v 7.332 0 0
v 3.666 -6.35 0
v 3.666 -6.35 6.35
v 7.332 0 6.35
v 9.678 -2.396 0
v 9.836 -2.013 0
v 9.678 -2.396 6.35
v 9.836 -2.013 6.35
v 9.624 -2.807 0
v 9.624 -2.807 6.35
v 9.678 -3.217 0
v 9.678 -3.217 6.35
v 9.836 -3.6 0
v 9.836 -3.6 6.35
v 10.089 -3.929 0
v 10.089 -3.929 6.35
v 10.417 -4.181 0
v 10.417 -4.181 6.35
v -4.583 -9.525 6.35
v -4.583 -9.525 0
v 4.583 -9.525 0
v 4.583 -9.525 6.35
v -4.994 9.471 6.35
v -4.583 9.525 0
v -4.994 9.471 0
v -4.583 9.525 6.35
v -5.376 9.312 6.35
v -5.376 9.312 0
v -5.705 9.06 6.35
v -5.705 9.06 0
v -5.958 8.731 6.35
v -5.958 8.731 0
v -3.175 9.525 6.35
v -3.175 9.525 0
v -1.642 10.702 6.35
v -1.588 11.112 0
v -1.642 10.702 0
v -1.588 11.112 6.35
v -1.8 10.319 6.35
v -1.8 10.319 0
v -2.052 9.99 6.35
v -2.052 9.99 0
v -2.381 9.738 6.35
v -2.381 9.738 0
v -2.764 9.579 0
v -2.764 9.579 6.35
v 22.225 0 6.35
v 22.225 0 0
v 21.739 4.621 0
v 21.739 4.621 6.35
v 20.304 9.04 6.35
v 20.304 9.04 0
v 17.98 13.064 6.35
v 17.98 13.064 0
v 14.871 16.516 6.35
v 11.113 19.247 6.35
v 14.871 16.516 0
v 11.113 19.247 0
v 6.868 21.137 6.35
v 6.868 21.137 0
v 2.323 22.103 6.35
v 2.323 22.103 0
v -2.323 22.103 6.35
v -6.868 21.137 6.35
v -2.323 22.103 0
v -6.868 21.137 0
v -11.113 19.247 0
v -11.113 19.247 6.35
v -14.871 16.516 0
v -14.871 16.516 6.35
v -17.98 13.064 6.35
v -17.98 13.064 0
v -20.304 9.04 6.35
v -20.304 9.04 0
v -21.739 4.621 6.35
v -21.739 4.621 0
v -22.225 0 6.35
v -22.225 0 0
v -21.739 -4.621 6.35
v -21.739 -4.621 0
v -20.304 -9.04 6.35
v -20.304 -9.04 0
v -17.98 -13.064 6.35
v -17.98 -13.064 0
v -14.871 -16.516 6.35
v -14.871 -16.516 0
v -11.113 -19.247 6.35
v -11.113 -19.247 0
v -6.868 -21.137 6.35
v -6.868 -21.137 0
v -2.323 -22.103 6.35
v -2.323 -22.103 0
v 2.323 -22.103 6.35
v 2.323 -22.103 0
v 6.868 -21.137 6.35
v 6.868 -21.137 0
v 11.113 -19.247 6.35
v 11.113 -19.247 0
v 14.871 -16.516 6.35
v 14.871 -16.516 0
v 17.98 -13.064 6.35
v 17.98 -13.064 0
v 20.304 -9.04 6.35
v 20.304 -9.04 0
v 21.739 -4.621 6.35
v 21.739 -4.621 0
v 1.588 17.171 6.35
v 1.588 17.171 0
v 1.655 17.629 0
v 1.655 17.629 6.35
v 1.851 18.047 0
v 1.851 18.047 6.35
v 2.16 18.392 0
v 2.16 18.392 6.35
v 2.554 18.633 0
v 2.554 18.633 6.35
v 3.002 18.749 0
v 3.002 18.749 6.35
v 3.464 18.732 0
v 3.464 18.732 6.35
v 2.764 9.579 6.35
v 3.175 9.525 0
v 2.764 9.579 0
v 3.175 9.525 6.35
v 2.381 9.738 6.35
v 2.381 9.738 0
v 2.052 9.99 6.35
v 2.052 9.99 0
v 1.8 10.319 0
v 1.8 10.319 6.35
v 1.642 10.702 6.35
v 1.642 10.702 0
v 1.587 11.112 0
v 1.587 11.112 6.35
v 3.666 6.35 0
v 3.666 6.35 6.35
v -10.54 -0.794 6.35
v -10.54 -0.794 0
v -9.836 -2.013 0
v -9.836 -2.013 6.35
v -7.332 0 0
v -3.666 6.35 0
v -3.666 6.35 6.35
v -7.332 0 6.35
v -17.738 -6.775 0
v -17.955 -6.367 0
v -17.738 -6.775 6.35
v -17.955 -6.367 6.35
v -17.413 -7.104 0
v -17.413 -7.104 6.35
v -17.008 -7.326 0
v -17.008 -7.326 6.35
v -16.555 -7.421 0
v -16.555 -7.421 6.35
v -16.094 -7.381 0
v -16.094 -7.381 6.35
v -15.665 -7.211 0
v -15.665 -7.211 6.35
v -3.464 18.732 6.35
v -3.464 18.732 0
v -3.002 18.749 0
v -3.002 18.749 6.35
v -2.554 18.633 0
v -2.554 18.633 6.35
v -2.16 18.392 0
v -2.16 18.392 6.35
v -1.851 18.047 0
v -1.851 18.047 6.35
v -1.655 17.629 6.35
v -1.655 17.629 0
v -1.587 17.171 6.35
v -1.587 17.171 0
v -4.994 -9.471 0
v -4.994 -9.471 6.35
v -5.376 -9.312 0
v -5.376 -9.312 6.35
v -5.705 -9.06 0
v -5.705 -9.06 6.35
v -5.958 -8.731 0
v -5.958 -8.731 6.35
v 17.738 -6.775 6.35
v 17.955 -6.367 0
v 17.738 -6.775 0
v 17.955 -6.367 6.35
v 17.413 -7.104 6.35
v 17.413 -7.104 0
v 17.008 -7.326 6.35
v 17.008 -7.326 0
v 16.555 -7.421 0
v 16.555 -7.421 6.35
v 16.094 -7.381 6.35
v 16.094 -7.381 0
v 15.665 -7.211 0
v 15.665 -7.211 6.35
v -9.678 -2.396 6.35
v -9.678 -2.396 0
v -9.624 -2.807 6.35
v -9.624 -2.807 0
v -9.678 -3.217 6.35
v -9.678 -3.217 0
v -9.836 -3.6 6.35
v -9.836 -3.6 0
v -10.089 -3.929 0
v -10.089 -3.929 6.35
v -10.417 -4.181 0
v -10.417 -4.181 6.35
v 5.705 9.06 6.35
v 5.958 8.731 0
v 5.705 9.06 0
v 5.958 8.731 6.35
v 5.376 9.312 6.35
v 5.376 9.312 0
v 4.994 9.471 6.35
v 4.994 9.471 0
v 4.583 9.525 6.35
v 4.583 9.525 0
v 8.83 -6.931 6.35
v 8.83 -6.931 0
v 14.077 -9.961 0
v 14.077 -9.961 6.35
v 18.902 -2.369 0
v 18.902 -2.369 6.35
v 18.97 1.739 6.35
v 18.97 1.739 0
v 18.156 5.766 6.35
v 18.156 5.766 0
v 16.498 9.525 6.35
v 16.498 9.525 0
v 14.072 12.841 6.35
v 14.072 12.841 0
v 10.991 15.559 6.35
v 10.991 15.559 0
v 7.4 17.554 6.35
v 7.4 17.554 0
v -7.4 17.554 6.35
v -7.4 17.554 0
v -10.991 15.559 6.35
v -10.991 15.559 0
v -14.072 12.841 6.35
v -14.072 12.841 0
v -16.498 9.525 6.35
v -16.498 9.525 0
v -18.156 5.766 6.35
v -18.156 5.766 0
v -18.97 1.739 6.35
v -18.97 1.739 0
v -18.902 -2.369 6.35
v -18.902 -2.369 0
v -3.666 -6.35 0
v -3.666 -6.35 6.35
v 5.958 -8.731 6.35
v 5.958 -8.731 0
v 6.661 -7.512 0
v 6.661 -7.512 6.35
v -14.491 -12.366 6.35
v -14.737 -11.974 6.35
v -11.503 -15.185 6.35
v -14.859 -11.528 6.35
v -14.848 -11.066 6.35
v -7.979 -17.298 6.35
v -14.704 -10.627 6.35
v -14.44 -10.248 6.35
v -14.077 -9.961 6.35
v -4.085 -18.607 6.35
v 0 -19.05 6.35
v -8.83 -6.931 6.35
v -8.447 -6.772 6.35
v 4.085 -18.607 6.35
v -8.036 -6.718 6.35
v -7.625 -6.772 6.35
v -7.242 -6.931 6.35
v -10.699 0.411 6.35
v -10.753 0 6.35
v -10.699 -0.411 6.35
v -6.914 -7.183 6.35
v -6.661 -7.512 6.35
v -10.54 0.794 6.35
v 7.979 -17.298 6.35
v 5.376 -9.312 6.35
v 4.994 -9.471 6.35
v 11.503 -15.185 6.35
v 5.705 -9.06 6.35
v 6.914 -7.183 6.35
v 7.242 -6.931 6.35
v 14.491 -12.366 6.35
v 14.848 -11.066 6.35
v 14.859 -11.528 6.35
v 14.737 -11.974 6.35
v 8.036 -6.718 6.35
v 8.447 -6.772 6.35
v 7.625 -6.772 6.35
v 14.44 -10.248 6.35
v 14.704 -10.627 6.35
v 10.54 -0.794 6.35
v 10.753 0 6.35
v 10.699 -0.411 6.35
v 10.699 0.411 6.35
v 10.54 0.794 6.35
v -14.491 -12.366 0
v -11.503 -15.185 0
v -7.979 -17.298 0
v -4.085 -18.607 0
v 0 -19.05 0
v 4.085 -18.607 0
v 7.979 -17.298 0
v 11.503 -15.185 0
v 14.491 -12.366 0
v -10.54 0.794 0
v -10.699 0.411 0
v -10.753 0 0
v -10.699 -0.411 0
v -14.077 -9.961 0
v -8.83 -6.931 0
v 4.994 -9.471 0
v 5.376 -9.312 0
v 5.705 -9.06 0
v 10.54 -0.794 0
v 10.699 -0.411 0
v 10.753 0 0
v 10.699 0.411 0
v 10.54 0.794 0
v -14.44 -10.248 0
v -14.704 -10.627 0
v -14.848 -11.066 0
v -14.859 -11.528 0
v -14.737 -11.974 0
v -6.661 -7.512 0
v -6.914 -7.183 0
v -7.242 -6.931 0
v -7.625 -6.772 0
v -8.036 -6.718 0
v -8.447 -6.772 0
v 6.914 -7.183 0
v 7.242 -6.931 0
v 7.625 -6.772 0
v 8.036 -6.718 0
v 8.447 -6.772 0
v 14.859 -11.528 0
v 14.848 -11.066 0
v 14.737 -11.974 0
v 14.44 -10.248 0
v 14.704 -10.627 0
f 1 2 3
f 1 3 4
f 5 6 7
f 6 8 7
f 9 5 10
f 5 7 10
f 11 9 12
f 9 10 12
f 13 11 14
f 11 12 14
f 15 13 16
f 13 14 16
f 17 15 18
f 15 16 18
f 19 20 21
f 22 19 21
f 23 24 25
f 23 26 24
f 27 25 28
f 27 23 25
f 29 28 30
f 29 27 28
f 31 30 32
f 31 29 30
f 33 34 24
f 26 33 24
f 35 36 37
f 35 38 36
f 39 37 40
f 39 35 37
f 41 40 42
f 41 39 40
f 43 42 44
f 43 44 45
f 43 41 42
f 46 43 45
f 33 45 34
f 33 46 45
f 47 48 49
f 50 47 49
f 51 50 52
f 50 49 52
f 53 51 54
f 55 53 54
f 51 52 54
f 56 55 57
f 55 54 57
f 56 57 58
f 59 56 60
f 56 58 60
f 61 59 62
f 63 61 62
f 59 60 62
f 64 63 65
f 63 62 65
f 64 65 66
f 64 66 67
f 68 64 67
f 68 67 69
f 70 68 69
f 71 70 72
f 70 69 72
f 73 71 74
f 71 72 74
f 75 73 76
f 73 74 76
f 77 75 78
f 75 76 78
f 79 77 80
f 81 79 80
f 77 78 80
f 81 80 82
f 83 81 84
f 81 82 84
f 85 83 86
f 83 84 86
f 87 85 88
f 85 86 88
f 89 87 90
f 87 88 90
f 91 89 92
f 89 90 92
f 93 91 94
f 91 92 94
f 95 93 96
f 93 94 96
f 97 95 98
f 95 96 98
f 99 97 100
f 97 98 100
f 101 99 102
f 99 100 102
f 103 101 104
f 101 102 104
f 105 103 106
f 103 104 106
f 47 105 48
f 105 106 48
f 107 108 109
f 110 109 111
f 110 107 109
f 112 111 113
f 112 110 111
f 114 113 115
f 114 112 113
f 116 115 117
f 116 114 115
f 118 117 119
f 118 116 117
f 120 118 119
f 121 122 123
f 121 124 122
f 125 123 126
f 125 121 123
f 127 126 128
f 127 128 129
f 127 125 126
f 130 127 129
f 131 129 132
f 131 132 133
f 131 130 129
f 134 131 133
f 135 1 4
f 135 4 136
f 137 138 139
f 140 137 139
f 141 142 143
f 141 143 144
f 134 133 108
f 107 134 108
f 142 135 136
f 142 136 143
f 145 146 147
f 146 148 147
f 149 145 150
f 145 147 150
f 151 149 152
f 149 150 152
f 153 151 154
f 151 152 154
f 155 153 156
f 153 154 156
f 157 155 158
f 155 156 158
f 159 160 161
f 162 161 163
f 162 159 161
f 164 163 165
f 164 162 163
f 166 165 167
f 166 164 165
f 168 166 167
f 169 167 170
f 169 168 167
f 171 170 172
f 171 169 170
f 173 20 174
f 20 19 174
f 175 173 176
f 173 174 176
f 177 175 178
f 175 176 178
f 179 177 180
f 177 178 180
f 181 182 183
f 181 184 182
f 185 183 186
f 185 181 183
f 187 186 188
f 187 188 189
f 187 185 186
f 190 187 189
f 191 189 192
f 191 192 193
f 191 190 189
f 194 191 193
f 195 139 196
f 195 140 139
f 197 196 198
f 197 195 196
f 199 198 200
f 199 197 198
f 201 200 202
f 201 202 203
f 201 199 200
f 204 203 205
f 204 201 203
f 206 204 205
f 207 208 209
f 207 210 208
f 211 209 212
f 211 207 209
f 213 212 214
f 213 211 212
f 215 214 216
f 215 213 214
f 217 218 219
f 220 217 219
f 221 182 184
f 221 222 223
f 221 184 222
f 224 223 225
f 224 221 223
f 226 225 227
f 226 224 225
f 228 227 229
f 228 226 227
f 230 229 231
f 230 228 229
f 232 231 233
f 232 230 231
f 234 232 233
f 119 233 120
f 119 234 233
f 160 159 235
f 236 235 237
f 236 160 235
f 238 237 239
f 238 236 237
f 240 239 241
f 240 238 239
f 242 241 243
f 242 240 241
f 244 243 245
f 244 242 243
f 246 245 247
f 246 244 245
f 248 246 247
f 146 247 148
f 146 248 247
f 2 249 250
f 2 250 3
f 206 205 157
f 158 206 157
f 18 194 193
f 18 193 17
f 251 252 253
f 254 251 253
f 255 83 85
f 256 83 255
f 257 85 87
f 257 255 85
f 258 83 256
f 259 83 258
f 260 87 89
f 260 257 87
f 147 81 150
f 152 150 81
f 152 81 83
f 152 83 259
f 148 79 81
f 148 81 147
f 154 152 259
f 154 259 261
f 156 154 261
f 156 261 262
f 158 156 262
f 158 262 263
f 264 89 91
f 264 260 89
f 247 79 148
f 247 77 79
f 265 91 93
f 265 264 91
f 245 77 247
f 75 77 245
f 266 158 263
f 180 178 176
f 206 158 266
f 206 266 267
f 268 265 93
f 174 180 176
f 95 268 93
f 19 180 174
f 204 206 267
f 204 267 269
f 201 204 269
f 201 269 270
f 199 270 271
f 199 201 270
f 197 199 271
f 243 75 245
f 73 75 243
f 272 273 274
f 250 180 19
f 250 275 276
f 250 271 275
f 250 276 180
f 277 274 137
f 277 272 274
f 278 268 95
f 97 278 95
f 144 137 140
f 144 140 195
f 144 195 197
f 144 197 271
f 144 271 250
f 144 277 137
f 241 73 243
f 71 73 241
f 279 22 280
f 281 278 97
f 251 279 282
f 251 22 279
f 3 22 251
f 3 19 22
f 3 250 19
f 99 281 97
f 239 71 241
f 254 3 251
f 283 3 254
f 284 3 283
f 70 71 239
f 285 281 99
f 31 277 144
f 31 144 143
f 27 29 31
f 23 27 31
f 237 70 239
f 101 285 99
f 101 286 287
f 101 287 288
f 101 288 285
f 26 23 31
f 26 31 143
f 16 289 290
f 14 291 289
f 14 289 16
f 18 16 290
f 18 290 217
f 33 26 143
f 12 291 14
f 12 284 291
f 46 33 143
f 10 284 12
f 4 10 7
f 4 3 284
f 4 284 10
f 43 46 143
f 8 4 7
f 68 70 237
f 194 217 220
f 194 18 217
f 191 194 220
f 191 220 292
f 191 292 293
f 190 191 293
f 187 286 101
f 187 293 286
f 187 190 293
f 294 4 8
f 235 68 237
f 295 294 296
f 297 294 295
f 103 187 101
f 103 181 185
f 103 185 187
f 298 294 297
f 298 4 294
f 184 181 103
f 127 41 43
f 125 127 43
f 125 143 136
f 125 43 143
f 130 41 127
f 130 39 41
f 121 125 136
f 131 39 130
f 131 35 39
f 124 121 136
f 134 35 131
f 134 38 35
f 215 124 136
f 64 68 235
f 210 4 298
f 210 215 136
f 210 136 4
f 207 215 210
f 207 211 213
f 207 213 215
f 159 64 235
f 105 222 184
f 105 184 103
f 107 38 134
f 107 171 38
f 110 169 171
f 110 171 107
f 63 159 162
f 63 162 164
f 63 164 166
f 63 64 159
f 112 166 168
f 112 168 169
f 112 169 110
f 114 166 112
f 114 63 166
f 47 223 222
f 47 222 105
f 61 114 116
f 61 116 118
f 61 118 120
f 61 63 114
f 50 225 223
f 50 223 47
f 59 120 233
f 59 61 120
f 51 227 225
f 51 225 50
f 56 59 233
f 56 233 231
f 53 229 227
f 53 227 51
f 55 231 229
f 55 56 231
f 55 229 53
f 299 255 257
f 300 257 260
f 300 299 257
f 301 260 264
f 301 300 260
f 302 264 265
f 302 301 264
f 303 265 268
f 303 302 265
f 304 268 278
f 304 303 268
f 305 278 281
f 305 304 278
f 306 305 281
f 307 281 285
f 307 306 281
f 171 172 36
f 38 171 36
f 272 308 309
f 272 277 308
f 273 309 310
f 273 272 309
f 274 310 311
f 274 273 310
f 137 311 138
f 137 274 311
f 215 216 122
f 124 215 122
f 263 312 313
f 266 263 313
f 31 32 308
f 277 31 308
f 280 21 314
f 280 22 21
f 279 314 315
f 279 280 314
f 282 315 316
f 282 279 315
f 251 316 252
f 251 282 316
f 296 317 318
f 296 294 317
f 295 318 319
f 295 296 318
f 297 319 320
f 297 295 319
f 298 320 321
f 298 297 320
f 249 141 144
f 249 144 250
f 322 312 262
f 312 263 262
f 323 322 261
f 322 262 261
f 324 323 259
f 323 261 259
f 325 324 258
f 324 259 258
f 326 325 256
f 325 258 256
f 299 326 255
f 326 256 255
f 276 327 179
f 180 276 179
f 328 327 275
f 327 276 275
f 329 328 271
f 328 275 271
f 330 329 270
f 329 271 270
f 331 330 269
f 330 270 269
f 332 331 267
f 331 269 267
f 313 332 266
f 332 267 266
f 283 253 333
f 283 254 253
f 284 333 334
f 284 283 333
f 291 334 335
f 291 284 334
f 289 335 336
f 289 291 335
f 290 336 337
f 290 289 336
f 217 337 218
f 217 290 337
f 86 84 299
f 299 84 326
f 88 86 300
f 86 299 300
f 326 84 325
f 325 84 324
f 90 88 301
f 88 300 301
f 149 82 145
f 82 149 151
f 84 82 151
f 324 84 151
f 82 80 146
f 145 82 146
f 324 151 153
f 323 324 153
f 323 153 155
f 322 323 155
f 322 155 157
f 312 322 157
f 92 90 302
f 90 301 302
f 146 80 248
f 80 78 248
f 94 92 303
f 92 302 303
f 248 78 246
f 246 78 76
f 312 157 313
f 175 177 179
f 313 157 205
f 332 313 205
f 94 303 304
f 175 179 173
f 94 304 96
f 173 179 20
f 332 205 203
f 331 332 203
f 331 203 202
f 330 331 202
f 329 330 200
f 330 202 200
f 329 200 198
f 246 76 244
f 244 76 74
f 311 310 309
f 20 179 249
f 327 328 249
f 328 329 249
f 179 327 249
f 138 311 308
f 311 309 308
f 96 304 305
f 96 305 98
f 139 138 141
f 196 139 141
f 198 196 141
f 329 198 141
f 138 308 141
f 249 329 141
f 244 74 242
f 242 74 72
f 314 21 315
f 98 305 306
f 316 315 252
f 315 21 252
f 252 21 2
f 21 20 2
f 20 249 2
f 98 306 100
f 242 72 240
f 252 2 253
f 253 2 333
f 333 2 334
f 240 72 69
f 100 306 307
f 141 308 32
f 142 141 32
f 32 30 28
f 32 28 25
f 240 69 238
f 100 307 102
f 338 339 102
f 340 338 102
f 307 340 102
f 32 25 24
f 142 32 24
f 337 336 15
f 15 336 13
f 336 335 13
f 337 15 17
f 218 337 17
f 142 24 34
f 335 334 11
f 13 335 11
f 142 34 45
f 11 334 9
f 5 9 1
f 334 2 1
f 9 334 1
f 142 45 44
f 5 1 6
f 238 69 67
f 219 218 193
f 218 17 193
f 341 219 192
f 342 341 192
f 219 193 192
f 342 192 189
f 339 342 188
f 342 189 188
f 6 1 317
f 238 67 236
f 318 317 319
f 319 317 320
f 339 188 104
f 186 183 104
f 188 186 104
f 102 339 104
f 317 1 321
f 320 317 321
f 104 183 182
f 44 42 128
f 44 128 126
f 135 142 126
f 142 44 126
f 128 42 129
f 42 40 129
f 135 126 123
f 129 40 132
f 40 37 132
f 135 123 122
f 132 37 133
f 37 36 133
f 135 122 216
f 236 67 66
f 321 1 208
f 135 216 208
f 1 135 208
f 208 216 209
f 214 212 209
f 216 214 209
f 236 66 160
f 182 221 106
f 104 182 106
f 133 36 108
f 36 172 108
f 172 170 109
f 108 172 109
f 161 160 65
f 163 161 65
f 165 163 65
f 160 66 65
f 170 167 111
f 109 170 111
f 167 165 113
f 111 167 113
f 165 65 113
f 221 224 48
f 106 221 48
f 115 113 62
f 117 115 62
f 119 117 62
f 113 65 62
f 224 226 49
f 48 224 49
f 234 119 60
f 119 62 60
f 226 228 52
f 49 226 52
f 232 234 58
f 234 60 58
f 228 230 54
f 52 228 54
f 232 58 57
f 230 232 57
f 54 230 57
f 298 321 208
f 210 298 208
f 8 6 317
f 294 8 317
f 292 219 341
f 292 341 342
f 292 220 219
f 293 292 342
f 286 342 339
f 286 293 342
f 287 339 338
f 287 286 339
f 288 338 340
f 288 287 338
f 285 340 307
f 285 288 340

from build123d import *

# Parameters (mm, degrees)
SKETCH1_R             = 22.225
SKETCH1_R_2           = 19.05
BOSS_EXTRUDE1_DEPTH   = 6.35
BOSS_EXTRUDE1_2_DEPTH = 6.35
BOSS_EXTRUDE2_DEPTH   = 6.35
CIRPATTERN1_COUNT     = 3
FILLET2_R             = 1.5875


with BuildPart() as part:
    # Sketch1 → Boss-Extrude1 (new body)
    with BuildSketch(Plane.XY):
        Circle(SKETCH1_R)
        Circle(SKETCH1_R_2, mode=Mode.SUBTRACT)
    extrude(amount=BOSS_EXTRUDE1_DEPTH)



with BuildPart() as body_2:
    # Sketch1 → Boss-Extrude1 2 (new body)
    with BuildSketch(Plane.XY):
        Polygon((-5.499261314, -9.525), (5.499261314, -9.525), (10.998522628, 0), (5.499261314, 9.525), (-5.499261314, 9.525), (-10.998522628, 0), align=None)
        Polygon((3.666174209, -6.35), (7.332348419, 0), (3.666174209, 6.35), (-3.666174209, 6.35), (-7.332348419, 0), (-3.666174209, -6.35), align=None, mode=Mode.SUBTRACT)
    extrude(amount=BOSS_EXTRUDE1_2_DEPTH)


with BuildPart() as part_1:
    add(part.part)

    add(body_2.part)  # Boss-Extrude2 merges body 2
    # Sketch4 → Boss-Extrude2 (add)
    with BuildSketch(Plane.XY):
        with BuildLine():
            Line((-1.5875, 18.98373893), (-1.5875, 9.525))
            Line((-1.5875, 9.525), (1.5875, 9.525))
            Line((1.5875, 9.525), (1.5875, 18.98373893))
            ThreePointArc((1.5875, 18.98373893), (0, 19.05), (-1.5875, 18.98373893))
        make_face()
    boss_extrude2 = extrude(amount=BOSS_EXTRUDE2_DEPTH)

    # CirPattern1: Boss-Extrude2 ×3 about axis
    cirpattern1_axis = Axis((0, 0, 0), (0, 0, 1))
    for i in range(1, CIRPATTERN1_COUNT):
        add(boss_extrude2.rotate(cirpattern1_axis, i * 360 / CIRPATTERN1_COUNT))

    # Fillet2
    fillet2_edges = [part_1.edges().sort_by_distance(p)[0] for p in [
        (-5.499261314, -9.525, 3.175),
        (-10.998522628, 0, 3.175),
        (-5.499261314, 9.525, 3.175),
        (5.499261314, 9.525, 3.175),
        (10.998522628, 0, 3.175),
        (5.499261314, -9.525, 3.175),
        (1.5875, 18.98373893, 3.175),
        (-1.5875, 18.98373893, 3.175),
        (-1.5875, 9.525, 3.175),
        (1.5875, 9.525, 3.175),
        (-17.234150172, -8.117054136, 3.175),
        (-15.646650172, -10.866684793, 3.175),
        (-7.455141971, -6.137315329, 3.175),
        (-9.042641971, -3.387684671, 3.175),
        (15.646650172, -10.866684793, 3.175),
        (17.234150172, -8.117054136, 3.175),
        (9.042641971, -3.387684671, 3.175),
        (7.455141971, -6.137315329, 3.175),
    ]]
    fillet(fillet2_edges, radius=FILLET2_R)


solid = part_1.part
